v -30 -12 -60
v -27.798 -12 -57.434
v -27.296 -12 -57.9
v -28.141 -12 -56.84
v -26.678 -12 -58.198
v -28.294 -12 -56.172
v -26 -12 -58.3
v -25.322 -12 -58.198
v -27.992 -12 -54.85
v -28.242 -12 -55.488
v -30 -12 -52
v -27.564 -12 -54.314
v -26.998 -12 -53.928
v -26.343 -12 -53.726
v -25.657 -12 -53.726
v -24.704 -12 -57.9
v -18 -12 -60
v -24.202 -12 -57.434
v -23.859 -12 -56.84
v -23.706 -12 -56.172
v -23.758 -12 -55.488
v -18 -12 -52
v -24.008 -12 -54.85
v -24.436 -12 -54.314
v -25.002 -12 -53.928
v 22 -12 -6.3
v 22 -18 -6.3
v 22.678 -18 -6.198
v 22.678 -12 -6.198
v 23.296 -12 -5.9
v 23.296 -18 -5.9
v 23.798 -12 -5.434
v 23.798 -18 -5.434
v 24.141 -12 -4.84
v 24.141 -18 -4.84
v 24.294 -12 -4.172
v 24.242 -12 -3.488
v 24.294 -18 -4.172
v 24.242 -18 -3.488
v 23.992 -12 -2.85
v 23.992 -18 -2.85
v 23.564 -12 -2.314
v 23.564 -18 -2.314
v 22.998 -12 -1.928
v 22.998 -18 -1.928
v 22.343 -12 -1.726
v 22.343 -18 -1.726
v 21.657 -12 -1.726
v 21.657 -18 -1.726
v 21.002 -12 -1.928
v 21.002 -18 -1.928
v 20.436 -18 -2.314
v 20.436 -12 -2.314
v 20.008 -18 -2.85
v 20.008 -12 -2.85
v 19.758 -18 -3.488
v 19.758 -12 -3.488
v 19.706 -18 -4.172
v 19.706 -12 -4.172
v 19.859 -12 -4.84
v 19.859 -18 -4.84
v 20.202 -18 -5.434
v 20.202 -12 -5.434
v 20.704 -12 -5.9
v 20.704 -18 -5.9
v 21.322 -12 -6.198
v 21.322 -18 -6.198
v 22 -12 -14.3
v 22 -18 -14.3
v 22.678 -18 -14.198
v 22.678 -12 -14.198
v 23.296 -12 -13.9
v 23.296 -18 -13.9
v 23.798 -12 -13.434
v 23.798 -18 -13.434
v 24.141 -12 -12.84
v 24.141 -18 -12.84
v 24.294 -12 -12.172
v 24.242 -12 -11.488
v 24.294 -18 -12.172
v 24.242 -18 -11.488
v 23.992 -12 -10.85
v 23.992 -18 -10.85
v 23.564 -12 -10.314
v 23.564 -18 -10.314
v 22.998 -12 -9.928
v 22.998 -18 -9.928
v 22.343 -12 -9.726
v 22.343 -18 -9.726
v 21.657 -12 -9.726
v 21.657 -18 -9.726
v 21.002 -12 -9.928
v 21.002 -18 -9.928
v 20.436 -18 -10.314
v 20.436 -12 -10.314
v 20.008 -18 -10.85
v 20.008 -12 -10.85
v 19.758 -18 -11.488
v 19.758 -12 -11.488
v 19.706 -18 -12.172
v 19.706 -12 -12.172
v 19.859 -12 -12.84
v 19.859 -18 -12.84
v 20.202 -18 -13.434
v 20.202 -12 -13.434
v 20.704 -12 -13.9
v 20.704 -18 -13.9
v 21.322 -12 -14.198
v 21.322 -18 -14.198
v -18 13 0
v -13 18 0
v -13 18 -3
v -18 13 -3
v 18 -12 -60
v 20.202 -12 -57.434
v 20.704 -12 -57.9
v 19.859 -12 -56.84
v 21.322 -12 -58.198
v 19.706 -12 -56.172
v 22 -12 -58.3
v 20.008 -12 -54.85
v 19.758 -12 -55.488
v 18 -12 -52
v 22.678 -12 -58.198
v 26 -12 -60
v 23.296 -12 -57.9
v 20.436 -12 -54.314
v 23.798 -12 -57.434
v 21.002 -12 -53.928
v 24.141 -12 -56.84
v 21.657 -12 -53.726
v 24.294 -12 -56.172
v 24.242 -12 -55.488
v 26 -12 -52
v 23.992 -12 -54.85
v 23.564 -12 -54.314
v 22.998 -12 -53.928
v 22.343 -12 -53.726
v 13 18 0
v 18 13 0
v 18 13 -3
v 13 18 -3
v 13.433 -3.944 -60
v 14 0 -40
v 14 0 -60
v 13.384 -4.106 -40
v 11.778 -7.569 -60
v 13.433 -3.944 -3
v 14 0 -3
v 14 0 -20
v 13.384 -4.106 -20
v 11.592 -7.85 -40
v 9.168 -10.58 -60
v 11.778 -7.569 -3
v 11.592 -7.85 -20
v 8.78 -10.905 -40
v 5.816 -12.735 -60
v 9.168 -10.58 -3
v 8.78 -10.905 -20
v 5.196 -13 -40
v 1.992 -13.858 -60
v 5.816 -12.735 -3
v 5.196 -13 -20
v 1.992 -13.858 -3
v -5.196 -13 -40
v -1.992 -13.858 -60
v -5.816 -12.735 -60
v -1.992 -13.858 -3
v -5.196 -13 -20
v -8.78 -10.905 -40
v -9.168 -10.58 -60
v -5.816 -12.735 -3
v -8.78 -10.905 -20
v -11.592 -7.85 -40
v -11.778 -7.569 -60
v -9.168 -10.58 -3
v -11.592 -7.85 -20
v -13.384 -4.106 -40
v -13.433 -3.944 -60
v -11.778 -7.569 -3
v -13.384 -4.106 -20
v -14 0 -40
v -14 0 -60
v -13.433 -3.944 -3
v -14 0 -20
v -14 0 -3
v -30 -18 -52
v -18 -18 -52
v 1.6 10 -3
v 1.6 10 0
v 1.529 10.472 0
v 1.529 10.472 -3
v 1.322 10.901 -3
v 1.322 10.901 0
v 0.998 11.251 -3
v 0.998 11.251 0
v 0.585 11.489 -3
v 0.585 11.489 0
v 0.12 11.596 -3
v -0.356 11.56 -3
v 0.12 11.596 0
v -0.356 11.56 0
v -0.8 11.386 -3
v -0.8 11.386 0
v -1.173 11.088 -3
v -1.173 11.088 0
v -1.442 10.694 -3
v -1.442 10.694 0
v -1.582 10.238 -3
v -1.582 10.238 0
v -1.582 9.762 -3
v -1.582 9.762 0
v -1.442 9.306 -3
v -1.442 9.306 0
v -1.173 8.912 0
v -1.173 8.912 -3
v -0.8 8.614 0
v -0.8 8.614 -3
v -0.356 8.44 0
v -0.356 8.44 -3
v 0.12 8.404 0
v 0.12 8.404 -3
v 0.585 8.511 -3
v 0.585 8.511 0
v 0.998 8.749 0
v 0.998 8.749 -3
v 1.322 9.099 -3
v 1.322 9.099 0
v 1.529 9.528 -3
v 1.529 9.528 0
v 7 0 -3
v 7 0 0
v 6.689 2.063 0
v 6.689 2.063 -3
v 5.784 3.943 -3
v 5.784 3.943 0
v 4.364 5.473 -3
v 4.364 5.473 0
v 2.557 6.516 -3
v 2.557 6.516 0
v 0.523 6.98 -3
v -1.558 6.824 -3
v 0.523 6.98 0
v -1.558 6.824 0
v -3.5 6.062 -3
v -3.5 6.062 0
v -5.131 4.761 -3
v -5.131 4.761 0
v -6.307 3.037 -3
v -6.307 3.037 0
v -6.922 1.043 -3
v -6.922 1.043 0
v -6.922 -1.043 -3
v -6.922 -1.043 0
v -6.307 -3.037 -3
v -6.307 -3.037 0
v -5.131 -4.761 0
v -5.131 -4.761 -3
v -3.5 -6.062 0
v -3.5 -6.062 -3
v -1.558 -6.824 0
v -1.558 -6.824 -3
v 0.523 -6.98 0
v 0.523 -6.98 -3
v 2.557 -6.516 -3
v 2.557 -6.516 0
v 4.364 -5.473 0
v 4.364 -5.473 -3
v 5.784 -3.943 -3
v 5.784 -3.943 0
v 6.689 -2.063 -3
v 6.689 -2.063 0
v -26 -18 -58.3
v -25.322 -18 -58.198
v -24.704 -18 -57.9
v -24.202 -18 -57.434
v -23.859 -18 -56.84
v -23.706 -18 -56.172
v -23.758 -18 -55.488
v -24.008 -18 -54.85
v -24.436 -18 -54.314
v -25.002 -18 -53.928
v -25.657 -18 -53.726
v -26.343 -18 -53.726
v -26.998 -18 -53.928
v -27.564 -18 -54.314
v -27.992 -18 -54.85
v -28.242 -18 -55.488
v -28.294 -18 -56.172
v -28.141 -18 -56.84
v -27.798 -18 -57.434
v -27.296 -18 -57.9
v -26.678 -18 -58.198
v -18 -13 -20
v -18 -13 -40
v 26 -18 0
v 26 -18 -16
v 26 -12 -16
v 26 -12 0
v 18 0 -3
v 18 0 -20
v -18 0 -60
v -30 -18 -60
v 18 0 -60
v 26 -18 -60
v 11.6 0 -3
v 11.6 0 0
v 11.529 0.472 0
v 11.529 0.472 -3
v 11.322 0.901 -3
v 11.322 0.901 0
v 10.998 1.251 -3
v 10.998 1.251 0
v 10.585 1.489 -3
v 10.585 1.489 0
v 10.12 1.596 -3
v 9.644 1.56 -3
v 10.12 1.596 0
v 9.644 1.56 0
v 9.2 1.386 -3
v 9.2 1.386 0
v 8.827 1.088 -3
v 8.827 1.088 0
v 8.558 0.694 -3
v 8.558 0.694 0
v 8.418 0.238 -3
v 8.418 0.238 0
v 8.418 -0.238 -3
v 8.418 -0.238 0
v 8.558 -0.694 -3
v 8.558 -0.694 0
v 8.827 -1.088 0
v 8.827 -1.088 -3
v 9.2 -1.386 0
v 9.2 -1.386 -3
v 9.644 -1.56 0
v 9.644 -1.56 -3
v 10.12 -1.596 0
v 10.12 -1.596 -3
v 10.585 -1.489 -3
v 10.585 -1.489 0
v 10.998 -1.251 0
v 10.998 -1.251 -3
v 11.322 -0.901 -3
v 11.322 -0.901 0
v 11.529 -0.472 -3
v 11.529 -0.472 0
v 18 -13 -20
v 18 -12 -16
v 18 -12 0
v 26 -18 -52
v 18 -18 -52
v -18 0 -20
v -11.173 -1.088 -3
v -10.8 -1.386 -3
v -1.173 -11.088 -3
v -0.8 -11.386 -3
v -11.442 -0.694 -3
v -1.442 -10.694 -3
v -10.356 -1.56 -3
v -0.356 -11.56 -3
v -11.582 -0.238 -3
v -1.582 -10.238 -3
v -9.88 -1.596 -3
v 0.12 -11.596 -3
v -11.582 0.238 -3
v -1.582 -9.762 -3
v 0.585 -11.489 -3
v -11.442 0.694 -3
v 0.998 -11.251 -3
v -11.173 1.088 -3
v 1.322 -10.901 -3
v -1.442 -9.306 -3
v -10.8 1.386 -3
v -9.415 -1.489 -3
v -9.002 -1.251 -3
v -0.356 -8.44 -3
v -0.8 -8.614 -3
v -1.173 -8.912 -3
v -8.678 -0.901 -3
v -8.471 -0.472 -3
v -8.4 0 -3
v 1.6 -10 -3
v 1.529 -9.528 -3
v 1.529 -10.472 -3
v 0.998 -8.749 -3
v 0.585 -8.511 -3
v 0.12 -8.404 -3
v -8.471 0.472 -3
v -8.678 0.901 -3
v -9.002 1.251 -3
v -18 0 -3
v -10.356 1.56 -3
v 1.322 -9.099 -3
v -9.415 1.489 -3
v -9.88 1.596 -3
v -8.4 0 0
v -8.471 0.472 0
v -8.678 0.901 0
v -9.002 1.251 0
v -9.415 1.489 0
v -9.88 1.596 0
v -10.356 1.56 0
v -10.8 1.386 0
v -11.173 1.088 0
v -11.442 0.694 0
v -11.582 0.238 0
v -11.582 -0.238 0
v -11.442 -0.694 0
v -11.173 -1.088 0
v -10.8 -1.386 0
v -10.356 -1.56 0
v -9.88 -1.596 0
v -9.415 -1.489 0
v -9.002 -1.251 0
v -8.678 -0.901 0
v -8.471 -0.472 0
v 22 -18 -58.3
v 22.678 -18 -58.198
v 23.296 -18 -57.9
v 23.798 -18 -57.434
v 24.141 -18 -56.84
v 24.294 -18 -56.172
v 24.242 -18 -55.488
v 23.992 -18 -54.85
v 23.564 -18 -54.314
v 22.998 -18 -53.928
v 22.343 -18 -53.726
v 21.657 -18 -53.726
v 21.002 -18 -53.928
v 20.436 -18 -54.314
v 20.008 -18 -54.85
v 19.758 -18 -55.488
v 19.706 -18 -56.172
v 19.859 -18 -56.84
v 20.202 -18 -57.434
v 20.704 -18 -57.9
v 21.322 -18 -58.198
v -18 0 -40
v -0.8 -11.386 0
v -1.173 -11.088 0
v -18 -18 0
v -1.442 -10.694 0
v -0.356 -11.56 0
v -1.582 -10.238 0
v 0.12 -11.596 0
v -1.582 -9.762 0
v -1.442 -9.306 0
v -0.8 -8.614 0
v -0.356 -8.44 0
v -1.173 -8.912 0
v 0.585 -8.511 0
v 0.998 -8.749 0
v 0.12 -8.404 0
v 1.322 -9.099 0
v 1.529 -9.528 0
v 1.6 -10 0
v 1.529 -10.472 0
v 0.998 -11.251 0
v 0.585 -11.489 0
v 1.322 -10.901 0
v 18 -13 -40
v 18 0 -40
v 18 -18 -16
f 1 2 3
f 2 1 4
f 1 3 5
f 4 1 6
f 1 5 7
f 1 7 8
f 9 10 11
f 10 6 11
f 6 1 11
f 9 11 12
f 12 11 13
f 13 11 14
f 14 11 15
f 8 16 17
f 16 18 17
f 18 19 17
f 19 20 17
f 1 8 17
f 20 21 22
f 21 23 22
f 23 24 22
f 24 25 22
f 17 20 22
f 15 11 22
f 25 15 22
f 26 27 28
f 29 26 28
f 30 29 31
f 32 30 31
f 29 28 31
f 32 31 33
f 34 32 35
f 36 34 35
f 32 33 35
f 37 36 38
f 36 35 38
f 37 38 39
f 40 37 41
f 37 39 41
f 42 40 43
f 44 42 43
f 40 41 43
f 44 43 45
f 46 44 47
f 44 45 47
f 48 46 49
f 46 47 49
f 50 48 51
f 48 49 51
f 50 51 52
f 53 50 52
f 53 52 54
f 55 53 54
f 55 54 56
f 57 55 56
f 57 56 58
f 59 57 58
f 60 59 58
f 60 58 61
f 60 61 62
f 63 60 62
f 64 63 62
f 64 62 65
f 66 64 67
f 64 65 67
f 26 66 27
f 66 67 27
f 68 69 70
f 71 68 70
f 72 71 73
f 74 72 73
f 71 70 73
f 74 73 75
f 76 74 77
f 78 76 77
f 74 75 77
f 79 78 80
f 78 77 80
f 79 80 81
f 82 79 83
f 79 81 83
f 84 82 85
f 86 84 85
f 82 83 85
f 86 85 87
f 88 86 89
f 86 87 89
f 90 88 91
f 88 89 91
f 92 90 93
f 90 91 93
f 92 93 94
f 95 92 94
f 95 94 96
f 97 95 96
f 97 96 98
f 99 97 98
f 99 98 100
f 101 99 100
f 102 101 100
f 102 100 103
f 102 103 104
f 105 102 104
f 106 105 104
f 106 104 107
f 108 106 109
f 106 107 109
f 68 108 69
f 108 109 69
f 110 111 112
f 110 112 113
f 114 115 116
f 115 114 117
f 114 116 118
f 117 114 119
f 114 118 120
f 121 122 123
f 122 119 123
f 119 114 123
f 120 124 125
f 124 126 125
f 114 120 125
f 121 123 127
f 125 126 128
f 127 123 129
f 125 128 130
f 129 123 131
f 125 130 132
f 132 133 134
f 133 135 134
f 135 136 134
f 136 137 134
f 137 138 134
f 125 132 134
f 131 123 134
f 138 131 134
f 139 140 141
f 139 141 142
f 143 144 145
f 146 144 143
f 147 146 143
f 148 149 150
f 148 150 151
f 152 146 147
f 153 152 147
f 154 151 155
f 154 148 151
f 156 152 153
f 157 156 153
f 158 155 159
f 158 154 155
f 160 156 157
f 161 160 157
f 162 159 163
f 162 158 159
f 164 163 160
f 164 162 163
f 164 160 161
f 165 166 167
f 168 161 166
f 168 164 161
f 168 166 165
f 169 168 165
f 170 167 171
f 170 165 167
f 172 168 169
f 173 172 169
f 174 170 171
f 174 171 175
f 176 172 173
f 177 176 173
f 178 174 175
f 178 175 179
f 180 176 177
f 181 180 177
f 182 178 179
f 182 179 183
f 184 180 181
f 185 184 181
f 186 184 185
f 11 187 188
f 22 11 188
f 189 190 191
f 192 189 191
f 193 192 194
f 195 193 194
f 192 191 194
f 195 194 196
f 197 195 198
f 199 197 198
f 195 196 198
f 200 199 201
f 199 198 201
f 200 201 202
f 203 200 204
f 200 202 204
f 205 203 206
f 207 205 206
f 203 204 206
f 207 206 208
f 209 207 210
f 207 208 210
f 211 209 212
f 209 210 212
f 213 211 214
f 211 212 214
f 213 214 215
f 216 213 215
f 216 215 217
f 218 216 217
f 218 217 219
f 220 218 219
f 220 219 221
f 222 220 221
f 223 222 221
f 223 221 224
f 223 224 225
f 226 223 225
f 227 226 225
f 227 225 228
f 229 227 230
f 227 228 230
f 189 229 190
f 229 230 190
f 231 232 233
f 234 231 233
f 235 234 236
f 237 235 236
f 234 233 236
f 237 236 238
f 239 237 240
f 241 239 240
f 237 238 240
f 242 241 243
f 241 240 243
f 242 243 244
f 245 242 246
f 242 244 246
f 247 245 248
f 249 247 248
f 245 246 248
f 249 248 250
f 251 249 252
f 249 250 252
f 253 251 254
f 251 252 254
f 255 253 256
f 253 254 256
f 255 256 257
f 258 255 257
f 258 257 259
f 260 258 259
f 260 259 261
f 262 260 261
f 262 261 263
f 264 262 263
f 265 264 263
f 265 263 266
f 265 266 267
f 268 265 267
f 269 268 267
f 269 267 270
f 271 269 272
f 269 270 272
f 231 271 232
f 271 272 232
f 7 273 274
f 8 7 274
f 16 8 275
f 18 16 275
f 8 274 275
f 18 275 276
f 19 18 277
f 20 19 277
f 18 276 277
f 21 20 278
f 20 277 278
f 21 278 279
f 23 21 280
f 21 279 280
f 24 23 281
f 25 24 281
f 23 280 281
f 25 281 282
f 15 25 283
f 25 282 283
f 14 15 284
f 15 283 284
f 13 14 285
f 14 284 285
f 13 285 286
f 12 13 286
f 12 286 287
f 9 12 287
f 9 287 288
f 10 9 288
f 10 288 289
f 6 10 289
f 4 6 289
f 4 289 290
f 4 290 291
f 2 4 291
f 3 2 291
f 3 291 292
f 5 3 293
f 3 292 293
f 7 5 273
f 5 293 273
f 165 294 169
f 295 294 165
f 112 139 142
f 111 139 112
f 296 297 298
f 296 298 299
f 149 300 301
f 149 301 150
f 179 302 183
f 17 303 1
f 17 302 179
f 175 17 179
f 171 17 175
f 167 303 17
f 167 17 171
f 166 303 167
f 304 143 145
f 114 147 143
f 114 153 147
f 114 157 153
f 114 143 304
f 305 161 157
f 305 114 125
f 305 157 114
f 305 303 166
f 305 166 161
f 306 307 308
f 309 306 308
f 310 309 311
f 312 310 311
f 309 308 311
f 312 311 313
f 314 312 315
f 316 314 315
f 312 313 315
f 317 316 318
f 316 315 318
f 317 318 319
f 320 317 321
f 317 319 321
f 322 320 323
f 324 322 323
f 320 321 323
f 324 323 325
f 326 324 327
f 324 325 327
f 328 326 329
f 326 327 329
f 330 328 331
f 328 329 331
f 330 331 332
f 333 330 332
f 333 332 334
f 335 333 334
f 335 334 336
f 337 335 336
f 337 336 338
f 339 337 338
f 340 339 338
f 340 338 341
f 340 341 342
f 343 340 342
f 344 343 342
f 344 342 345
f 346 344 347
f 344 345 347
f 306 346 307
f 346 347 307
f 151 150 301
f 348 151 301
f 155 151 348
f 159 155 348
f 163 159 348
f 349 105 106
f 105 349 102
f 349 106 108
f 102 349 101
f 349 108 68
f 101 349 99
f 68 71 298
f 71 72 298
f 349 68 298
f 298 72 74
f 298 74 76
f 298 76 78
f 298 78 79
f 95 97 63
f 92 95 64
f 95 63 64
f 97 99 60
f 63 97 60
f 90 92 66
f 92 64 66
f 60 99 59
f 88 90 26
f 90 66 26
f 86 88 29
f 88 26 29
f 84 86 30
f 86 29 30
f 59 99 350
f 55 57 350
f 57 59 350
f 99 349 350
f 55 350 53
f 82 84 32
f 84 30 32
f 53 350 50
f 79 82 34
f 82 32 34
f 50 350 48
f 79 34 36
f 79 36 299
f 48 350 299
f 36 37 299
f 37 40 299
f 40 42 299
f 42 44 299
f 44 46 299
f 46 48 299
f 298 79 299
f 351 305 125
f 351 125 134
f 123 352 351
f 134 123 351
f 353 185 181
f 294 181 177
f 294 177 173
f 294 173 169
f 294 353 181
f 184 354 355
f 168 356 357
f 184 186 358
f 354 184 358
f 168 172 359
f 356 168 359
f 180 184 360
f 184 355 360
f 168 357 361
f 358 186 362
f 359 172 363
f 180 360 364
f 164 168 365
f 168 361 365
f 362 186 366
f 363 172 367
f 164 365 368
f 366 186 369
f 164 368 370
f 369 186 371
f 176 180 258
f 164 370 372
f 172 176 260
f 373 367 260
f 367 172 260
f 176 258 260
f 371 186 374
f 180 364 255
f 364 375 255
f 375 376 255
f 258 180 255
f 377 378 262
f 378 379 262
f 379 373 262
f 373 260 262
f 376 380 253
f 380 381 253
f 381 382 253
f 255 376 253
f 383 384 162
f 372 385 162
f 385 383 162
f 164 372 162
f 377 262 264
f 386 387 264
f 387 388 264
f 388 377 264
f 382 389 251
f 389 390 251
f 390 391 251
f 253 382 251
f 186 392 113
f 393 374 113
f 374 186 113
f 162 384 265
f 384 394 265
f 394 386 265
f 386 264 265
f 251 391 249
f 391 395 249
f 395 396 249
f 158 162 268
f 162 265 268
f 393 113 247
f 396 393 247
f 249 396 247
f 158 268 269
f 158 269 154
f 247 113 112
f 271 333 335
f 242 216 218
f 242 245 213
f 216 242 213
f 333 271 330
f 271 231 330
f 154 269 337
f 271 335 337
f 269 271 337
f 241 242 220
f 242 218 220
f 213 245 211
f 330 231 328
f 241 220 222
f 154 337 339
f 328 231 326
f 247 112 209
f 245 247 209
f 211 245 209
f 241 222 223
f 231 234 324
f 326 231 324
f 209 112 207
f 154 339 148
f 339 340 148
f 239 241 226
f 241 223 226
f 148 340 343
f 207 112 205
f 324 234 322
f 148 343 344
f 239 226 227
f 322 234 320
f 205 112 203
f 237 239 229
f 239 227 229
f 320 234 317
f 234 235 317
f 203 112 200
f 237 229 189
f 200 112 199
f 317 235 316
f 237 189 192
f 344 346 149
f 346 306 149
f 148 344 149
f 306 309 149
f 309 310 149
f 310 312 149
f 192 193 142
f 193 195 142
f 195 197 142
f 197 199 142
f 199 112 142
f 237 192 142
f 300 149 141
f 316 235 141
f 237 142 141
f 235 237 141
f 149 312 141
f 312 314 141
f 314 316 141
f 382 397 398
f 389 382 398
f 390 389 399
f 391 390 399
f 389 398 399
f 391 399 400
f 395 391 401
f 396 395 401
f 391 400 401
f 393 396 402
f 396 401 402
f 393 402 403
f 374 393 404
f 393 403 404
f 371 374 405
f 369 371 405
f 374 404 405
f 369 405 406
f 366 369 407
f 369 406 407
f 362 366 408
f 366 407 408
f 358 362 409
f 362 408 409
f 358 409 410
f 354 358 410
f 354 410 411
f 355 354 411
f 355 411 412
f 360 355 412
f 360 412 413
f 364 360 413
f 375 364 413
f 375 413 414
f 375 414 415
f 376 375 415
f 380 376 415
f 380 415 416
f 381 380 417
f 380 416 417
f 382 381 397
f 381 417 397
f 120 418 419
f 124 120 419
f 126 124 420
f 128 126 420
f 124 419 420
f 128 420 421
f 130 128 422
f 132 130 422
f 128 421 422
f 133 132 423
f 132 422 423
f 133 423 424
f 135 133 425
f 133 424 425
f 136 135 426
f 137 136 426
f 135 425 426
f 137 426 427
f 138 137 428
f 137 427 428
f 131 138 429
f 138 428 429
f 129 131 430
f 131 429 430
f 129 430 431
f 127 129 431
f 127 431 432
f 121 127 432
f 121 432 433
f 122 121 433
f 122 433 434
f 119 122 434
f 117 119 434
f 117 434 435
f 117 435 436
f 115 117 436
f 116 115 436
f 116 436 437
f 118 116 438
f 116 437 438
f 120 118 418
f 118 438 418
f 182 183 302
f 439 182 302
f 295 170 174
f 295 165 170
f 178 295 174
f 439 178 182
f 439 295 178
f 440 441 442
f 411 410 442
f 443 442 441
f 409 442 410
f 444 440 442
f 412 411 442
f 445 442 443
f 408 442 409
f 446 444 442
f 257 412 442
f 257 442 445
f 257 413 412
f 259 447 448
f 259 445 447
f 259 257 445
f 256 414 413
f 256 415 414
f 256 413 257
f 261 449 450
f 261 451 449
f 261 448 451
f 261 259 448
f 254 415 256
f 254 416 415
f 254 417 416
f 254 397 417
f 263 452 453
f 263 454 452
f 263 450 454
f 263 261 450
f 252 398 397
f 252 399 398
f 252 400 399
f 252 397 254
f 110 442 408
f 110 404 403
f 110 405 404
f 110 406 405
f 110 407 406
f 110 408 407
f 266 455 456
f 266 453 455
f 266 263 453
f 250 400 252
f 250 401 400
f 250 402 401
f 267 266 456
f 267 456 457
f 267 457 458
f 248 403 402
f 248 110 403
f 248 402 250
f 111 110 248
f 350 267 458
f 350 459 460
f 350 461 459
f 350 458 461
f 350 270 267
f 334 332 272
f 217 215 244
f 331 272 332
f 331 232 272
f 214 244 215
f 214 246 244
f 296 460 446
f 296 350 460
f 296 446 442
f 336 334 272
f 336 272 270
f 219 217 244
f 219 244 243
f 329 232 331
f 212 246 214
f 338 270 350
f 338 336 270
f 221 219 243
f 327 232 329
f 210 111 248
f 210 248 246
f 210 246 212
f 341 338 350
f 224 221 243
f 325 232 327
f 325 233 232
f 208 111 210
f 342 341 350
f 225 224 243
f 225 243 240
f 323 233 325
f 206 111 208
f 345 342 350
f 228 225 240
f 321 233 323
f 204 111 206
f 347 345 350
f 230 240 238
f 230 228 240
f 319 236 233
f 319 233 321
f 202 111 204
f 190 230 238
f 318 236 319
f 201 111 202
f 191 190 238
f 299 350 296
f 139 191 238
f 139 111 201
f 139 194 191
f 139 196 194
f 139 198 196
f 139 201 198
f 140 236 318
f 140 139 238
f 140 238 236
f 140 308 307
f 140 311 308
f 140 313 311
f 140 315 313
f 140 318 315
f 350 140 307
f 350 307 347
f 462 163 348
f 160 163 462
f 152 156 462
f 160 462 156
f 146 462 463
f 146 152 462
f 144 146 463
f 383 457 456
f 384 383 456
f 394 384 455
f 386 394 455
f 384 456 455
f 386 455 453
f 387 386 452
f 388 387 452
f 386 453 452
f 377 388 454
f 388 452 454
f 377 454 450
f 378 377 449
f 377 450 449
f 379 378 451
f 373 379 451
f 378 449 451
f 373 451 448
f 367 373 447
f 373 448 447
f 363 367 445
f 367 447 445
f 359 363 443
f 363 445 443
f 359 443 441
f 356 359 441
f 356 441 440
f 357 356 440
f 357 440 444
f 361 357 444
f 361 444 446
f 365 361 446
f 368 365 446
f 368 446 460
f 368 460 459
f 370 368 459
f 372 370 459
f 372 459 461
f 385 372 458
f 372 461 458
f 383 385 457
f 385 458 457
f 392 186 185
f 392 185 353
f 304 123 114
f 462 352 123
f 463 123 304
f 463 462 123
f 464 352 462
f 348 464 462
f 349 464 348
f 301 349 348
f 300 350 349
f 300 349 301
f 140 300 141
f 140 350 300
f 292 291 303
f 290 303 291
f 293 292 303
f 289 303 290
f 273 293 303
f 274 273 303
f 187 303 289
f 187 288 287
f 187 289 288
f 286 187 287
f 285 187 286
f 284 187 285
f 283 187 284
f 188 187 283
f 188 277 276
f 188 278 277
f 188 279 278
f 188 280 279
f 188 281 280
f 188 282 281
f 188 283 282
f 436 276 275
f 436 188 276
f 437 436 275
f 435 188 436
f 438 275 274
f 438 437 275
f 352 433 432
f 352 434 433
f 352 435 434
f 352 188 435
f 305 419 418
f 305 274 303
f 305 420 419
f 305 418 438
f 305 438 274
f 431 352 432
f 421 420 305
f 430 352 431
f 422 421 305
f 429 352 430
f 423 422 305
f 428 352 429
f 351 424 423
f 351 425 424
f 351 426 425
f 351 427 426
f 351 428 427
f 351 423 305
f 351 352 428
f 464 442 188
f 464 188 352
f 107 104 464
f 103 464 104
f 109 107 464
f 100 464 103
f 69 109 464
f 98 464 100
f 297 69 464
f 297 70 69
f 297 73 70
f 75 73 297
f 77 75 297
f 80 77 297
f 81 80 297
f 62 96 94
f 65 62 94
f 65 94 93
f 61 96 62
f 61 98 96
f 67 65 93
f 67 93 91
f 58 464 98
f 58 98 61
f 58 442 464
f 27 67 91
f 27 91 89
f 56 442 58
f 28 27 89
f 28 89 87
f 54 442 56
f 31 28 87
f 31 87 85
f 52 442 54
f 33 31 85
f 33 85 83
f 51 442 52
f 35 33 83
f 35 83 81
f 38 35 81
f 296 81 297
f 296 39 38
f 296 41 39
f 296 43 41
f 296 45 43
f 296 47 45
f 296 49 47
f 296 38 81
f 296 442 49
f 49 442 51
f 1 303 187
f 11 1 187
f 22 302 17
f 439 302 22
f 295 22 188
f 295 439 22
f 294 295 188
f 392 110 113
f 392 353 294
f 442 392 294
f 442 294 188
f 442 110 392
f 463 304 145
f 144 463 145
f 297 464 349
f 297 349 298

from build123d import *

# Parameters (mm, degrees)
BOSS_EXTRU_1_DEPTH      = 60
ESQUISSE1_3_R           = 1.6
ESQUISSE1_3_R_2         = 7
BOSS_EXTRU_2_DEPTH      = 3
ENL_V_MAT_EXTRU_2_DEPTH = 50
ESQUISSE2_W             = 8
ESQUISSE2_H             = 8
ESQUISSE2_R             = 2.3
ESQUISSE2_H_2           = 16
ESQUISSE2_W_2           = 12
BOSS_EXTRU_4_DEPTH      = 6


with BuildPart() as part:
    # Esquisse1 → Boss.-Extru.1 (new body)
    with BuildSketch(Plane.XY):
        with BuildLine():
            Line((-18, -18), (18, -18))
            Line((18, -18), (18, 0))
            Line((18, 0), (14, 0))
            ThreePointArc((14, 0), (0, -14), (-14, 0))
            Line((-14, 0), (-18, 0))
            Line((-18, 0), (-18, -18))
        make_face()
    extrude(amount=-BOSS_EXTRU_1_DEPTH)

    # Esquisse1<3> → Boss.-Extru.2 (add)
    with BuildSketch(Plane.XY):
        with BuildLine():
            Line((14, 0), (18, 0))
            Line((18, 0), (18, 13))
            Line((18, 13), (13, 18))
            Line((13, 18), (-13, 18))
            Line((-13, 18), (-18, 13))
            Line((-18, 13), (-18, 0))
            Line((-18, 0), (-14, 0))
            ThreePointArc((-14, 0), (0, -14), (14, 0))
        make_face()
        with Locations((0, 10)):
            Circle(ESQUISSE1_3_R, mode=Mode.SUBTRACT)
        with Locations((0, -10)):
            Circle(ESQUISSE1_3_R, mode=Mode.SUBTRACT)
        with Locations((-10, 0)):
            Circle(ESQUISSE1_3_R, mode=Mode.SUBTRACT)
        Circle(ESQUISSE1_3_R_2, mode=Mode.SUBTRACT)
        with Locations((10, 0)):
            Circle(ESQUISSE1_3_R, mode=Mode.SUBTRACT)
    extrude(amount=-BOSS_EXTRU_2_DEPTH)

    # Esquisse3 → Enlèv. mat.-Extru.2 (cut)
    with BuildSketch(Plane.ZY.offset(18)):
        Polygon((-30, 0), (-20, 0), (-20, -13), (-40, -13), (-40, 0), align=None)
    extrude(amount=-ENL_V_MAT_EXTRU_2_DEPTH, mode=Mode.SUBTRACT)

    # Esquisse2 → Boss.-Extru.4 (add)
    # profile 1 of 3: a face of its own
    with BuildSketch(Plane.XZ.offset(18)):
        with Locations((22, -56)):
            Rectangle(ESQUISSE2_W, ESQUISSE2_H)
        with Locations((22, -56)):
            Circle(ESQUISSE2_R, mode=Mode.SUBTRACT)
    # profile 2 of 3: a face of its own
    with BuildSketch(Plane.XZ.offset(18)):
        with Locations((22, -8)):
            Rectangle(ESQUISSE2_W, ESQUISSE2_H_2)
        with Locations((22, -12)):
            Circle(ESQUISSE2_R, mode=Mode.SUBTRACT)
        with Locations((22, -4)):
            Circle(ESQUISSE2_R, mode=Mode.SUBTRACT)
    # profile 3 of 3: a face of its own
    with BuildSketch(Plane.XZ.offset(18)):
        with Locations((-24, -56)):
            Rectangle(ESQUISSE2_W_2, ESQUISSE2_H)
        with Locations((-26, -56)):
            Circle(ESQUISSE2_R, mode=Mode.SUBTRACT)
    extrude(amount=-BOSS_EXTRU_4_DEPTH)


solid = part.part
